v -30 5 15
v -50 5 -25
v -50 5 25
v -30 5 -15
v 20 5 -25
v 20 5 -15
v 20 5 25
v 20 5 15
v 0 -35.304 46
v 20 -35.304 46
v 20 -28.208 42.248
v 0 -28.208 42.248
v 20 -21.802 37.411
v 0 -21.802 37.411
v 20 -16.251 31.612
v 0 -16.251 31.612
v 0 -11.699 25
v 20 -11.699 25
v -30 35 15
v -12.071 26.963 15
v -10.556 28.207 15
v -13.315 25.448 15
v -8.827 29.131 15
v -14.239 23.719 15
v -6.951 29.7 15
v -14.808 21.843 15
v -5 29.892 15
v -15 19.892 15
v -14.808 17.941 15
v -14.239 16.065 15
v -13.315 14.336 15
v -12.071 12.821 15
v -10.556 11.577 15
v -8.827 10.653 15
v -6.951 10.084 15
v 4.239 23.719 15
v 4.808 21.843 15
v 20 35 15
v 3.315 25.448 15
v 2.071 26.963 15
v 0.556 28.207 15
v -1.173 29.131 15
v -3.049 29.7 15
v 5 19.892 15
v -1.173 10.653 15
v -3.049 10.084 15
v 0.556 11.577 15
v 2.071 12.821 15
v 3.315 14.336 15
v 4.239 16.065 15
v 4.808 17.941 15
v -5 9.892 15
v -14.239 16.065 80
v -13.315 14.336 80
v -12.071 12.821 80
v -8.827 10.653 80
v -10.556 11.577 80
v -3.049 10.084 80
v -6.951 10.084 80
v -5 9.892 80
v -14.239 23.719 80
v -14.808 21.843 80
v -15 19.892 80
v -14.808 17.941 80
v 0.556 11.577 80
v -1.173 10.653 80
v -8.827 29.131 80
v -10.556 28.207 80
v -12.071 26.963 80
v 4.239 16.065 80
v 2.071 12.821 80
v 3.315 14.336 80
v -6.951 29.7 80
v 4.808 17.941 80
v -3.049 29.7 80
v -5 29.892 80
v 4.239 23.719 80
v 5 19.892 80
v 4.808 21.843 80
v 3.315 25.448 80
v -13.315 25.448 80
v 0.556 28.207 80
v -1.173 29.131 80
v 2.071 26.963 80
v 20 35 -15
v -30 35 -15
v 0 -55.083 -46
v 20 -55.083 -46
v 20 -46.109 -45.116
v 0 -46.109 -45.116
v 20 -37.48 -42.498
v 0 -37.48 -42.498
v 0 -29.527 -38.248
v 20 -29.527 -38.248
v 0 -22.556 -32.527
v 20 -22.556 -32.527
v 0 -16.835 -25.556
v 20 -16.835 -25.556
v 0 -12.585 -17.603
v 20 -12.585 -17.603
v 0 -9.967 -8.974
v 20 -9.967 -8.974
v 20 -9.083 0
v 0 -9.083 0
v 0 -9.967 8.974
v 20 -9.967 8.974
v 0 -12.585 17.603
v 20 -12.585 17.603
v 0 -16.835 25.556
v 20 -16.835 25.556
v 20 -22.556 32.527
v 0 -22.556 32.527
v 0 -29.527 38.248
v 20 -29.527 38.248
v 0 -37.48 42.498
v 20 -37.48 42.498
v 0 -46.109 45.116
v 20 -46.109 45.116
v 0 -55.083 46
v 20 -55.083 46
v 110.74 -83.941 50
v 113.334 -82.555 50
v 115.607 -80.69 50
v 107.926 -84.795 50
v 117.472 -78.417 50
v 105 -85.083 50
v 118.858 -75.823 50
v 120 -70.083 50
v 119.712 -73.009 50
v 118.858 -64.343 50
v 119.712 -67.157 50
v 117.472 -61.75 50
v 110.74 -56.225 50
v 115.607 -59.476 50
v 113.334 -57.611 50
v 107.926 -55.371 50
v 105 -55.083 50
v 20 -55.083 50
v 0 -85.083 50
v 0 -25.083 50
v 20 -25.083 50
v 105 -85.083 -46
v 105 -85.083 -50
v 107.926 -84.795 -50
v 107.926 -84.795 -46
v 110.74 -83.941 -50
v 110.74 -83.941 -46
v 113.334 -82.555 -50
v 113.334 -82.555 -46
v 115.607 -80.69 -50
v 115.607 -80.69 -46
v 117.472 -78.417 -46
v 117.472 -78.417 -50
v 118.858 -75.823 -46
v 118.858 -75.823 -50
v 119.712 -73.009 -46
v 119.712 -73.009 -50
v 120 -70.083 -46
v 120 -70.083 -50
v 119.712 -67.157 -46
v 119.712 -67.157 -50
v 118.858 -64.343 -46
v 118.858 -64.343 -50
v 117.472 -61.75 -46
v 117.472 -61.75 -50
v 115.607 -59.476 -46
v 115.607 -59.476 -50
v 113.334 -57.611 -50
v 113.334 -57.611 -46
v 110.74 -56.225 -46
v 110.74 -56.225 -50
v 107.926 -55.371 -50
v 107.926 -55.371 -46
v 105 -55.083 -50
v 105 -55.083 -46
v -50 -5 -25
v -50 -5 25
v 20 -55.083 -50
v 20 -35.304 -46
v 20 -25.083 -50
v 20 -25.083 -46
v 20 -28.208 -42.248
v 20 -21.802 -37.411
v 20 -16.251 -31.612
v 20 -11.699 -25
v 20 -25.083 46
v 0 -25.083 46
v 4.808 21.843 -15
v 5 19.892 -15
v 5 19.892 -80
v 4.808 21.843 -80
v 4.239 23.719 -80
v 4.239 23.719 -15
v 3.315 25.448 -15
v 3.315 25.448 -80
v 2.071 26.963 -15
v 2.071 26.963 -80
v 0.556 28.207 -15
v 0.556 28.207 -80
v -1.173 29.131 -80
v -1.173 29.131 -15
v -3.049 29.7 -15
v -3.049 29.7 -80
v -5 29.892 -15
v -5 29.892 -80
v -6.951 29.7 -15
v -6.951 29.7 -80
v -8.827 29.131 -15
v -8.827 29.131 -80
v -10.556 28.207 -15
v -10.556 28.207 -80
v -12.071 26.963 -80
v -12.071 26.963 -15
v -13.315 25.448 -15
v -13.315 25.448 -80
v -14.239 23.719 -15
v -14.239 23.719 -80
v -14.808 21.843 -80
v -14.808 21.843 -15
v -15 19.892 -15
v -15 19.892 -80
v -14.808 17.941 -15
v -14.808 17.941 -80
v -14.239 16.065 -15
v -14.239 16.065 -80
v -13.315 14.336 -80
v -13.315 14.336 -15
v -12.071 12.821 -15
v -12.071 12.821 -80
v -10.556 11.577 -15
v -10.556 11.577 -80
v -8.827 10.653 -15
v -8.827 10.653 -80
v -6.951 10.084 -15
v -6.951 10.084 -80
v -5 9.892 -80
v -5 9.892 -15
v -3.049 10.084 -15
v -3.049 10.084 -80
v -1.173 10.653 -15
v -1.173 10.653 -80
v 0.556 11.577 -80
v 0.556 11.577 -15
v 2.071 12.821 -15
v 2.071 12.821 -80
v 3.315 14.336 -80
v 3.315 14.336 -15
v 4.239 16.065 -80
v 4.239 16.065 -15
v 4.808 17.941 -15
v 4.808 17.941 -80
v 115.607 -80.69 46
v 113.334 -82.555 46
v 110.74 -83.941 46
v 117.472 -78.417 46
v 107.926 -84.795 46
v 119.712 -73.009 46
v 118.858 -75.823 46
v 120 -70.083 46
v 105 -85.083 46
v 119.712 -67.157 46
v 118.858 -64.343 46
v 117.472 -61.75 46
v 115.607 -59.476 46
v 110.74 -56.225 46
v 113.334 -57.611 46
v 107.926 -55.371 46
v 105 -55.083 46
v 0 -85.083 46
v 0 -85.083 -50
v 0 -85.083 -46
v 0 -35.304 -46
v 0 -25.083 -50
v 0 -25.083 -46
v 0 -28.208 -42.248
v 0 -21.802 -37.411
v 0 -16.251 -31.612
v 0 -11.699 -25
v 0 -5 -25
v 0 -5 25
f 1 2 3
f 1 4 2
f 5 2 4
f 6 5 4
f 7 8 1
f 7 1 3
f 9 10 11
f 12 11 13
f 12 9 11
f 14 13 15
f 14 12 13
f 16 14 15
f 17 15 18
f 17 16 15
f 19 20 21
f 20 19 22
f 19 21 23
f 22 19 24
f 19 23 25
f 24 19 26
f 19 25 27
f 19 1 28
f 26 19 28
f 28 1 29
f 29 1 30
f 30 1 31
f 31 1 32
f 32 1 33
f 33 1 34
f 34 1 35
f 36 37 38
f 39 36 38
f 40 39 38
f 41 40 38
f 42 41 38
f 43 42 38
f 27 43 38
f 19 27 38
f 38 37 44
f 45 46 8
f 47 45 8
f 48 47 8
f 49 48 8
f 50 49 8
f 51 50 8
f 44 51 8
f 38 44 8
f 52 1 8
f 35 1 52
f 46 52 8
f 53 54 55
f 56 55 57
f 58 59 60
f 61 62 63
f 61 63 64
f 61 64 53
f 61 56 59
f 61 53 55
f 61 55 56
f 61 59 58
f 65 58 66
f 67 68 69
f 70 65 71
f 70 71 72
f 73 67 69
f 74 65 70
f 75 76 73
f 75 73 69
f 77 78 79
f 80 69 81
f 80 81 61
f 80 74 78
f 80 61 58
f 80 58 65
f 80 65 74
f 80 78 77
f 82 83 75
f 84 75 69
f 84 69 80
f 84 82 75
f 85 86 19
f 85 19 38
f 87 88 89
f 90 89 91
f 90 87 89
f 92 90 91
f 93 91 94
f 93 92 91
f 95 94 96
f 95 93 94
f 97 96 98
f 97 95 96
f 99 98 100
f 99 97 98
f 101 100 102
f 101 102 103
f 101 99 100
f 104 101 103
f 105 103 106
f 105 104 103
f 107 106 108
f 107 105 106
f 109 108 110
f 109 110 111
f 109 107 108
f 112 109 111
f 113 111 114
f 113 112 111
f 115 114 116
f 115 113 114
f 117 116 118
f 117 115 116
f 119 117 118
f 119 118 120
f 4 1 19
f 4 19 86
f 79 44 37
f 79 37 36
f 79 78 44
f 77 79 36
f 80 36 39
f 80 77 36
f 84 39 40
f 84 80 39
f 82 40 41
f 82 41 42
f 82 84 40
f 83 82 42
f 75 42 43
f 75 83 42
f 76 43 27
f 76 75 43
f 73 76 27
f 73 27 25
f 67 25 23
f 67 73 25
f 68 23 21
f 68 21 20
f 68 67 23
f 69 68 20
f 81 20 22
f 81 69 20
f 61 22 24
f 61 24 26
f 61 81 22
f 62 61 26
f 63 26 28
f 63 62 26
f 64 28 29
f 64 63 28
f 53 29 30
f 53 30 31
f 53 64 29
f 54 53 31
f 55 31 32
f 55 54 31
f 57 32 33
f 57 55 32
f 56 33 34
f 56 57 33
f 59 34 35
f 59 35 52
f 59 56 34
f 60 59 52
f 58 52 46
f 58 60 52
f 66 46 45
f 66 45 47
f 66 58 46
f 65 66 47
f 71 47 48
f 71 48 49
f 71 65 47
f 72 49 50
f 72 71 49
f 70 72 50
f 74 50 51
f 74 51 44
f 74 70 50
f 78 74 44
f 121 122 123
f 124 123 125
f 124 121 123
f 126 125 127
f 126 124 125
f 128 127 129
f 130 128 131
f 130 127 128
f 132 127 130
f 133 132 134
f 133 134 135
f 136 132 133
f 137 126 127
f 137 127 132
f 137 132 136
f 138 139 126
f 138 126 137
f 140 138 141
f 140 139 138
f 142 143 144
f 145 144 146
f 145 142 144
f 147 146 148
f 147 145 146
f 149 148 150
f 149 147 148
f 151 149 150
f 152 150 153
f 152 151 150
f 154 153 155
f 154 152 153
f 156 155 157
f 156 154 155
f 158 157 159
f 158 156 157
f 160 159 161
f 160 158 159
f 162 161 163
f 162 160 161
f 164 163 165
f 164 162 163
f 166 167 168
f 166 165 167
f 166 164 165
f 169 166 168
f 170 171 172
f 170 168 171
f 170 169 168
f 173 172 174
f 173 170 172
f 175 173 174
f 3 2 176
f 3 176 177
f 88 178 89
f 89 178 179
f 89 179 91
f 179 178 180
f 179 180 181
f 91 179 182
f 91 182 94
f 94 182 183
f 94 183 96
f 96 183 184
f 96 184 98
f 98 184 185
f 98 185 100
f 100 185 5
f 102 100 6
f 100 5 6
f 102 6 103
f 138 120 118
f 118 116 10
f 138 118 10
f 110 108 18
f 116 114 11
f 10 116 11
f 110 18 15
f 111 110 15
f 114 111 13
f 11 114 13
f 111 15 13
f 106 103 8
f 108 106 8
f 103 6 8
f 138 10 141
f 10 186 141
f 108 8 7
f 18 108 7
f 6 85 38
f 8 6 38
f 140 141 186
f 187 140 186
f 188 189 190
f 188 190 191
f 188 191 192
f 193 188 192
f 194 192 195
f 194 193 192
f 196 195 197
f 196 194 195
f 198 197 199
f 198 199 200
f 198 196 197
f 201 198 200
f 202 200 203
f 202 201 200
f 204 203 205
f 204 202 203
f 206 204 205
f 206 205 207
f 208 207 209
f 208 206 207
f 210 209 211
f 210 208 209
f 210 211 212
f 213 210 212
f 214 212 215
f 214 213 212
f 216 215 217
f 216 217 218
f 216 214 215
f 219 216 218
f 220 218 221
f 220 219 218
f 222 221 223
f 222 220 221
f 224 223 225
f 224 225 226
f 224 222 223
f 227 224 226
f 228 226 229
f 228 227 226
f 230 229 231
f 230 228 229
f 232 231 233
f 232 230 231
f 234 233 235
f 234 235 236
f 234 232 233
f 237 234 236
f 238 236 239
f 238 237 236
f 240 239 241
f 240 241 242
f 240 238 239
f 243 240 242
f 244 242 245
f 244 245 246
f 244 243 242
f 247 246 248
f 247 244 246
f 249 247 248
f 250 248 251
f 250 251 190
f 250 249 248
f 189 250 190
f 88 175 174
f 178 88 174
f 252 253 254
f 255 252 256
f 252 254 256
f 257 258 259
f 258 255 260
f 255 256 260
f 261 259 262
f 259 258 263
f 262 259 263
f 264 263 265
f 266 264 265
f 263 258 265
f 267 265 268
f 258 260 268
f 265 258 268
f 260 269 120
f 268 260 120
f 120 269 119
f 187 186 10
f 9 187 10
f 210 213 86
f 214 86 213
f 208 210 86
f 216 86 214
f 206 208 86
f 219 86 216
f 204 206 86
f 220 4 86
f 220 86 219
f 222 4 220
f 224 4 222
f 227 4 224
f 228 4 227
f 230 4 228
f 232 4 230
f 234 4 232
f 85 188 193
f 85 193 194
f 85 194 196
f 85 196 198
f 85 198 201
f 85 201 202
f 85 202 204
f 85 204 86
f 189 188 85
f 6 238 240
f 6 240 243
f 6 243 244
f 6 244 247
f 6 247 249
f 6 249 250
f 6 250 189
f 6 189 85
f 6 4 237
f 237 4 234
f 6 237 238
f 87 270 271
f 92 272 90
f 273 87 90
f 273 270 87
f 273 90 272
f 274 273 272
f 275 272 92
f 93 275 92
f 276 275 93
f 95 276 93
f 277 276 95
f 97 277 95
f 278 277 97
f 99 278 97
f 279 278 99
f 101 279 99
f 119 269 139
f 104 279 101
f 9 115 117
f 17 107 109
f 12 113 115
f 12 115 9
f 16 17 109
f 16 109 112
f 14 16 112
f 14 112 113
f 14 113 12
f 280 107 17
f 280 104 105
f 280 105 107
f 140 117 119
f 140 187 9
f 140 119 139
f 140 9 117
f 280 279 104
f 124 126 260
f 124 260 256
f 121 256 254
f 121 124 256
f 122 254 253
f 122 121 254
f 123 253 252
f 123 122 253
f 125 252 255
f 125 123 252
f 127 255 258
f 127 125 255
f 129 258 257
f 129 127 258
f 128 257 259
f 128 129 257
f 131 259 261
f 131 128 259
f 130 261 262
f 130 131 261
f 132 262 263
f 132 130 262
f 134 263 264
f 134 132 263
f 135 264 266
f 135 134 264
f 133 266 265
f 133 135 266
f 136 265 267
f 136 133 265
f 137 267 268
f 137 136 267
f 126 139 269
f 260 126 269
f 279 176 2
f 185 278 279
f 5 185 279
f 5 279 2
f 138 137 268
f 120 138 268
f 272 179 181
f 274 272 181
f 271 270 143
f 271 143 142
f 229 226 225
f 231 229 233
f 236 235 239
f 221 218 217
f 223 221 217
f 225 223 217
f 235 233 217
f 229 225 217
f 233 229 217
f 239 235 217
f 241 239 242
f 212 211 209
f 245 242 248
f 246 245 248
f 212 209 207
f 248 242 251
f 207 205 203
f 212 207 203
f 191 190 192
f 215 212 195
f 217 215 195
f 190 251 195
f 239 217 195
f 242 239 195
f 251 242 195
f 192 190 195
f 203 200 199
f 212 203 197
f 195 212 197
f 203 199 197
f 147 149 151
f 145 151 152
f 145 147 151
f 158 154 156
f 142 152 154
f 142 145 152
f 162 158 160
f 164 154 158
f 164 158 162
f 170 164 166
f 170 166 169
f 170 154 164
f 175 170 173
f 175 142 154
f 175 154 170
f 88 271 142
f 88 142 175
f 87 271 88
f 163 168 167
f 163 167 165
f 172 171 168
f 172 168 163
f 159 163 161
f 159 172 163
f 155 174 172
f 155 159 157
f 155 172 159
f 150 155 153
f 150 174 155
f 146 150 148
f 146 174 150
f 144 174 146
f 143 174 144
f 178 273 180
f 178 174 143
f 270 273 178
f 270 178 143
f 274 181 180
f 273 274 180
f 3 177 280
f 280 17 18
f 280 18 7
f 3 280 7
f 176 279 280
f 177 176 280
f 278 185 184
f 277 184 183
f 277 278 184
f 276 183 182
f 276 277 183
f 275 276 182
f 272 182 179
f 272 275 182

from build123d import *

# Parameters (mm, degrees)
EXTRUDE_1_DEPTH     = 20
SKETCH_2_W          = 4
SKETCH_2_H          = 30
EXTRUDE_2_DEPTH     = 100
CUT_EXTRUDE_1_DEPTH = 100
SKETCH_4_W          = 50
SKETCH_4_H          = 10
EXTRUDE_3_DEPTH     = 50
SKETCH_5_W          = 50
SKETCH_5_H          = 30
EXTRUDE_4_DEPTH     = 30
SKETCH_6_R          = 10
EXTRUDE_5_DEPTH     = 80


with BuildPart() as part:
    # 草图1 → 凸台-拉伸1 (new body)
    with BuildSketch(Plane(origin=(0, 0, 0), x_dir=(0, 0, -1), z_dir=(1, 0, 0))):
        with BuildLine():
            Line((-25, 5), (25, 5))
            Line((25, 5), (25, -5))
            Line((25, -5), (25, -11.698777218))
            ThreePointArc((25, -11.698777218), (37.410642162, -21.801835726), (46, -35.304382227))
            Line((46, -35.304382227), (46, -25.083062159))
            Line((46, -25.083062159), (50, -25.083062159))
            Line((50, -25.083062159), (50, -85.083062159))
            Line((50, -85.083062159), (46, -85.083062159))
            Line((46, -85.083062159), (46, -55.083062159))
            ThreePointArc((46, -55.083062159), (0, -9.083062159), (-46, -55.083062159))
            Line((-46, -55.083062159), (-46, -85.083062159))
            Line((-46, -85.083062159), (-50, -85.083062159))
            Line((-50, -85.083062159), (-50, -25.083062159))
            Line((-50, -25.083062159), (-46, -25.083062159))
            Line((-46, -25.083062159), (-46, -35.304382227))
            ThreePointArc((-46, -35.304382227), (-37.410642162, -21.801835726), (-25, -11.698777218))
            Line((-25, -11.698777218), (-25, -5))
            Line((-25, -5), (-25, 5))
        make_face()
    extrude(amount=EXTRUDE_1_DEPTH)

    # 草图2 → 凸台-拉伸2 (add)
    with BuildSketch(Plane(origin=(20, 0, 0), x_dir=(0, 0, -1), z_dir=(1, 0, 0))):
        with Locations((-48, -70.083062159)):
            Rectangle(SKETCH_2_W, SKETCH_2_H)
        with Locations((48, -70.083062159)):
            Rectangle(SKETCH_2_W, SKETCH_2_H)
    extrude(amount=EXTRUDE_2_DEPTH)

    # 草图3 → 切除-拉伸1 (cut)
    with BuildSketch(Plane.XY.offset(50)):
        with BuildLine():
            Line((105, -55.083062159), (132.360099234, -55.083062159))
            Line((132.360099234, -55.083062159), (132.360099234, -85.083062159))
            Line((132.360099234, -85.083062159), (105, -85.083062159))
            ThreePointArc((105, -85.083062159), (120, -70.083062159), (105, -55.083062159))
        make_face()
    extrude(amount=-CUT_EXTRUDE_1_DEPTH, mode=Mode.SUBTRACT)

    # 草图4 → 凸台-拉伸3 (add)
    with BuildSketch(Plane.ZY):
        Rectangle(SKETCH_4_W, SKETCH_4_H)
    extrude(amount=EXTRUDE_3_DEPTH)

    # 草图5 → 凸台-拉伸4 (add)
    with BuildSketch(Plane(origin=(0, 5, 0), x_dir=(1, 0, 0), z_dir=(0, 1, 0))):
        with Locations((-5, 0)):
            Rectangle(SKETCH_5_W, SKETCH_5_H)
    extrude(amount=EXTRUDE_4_DEPTH)

    # 草图6 → 凸台-拉伸5 (add, symmetric)
    with BuildSketch(Plane.XY):
        with Locations((-5, 19.891808083)):
            Circle(SKETCH_6_R)
    extrude(amount=EXTRUDE_5_DEPTH, both=True)


solid = part.part
